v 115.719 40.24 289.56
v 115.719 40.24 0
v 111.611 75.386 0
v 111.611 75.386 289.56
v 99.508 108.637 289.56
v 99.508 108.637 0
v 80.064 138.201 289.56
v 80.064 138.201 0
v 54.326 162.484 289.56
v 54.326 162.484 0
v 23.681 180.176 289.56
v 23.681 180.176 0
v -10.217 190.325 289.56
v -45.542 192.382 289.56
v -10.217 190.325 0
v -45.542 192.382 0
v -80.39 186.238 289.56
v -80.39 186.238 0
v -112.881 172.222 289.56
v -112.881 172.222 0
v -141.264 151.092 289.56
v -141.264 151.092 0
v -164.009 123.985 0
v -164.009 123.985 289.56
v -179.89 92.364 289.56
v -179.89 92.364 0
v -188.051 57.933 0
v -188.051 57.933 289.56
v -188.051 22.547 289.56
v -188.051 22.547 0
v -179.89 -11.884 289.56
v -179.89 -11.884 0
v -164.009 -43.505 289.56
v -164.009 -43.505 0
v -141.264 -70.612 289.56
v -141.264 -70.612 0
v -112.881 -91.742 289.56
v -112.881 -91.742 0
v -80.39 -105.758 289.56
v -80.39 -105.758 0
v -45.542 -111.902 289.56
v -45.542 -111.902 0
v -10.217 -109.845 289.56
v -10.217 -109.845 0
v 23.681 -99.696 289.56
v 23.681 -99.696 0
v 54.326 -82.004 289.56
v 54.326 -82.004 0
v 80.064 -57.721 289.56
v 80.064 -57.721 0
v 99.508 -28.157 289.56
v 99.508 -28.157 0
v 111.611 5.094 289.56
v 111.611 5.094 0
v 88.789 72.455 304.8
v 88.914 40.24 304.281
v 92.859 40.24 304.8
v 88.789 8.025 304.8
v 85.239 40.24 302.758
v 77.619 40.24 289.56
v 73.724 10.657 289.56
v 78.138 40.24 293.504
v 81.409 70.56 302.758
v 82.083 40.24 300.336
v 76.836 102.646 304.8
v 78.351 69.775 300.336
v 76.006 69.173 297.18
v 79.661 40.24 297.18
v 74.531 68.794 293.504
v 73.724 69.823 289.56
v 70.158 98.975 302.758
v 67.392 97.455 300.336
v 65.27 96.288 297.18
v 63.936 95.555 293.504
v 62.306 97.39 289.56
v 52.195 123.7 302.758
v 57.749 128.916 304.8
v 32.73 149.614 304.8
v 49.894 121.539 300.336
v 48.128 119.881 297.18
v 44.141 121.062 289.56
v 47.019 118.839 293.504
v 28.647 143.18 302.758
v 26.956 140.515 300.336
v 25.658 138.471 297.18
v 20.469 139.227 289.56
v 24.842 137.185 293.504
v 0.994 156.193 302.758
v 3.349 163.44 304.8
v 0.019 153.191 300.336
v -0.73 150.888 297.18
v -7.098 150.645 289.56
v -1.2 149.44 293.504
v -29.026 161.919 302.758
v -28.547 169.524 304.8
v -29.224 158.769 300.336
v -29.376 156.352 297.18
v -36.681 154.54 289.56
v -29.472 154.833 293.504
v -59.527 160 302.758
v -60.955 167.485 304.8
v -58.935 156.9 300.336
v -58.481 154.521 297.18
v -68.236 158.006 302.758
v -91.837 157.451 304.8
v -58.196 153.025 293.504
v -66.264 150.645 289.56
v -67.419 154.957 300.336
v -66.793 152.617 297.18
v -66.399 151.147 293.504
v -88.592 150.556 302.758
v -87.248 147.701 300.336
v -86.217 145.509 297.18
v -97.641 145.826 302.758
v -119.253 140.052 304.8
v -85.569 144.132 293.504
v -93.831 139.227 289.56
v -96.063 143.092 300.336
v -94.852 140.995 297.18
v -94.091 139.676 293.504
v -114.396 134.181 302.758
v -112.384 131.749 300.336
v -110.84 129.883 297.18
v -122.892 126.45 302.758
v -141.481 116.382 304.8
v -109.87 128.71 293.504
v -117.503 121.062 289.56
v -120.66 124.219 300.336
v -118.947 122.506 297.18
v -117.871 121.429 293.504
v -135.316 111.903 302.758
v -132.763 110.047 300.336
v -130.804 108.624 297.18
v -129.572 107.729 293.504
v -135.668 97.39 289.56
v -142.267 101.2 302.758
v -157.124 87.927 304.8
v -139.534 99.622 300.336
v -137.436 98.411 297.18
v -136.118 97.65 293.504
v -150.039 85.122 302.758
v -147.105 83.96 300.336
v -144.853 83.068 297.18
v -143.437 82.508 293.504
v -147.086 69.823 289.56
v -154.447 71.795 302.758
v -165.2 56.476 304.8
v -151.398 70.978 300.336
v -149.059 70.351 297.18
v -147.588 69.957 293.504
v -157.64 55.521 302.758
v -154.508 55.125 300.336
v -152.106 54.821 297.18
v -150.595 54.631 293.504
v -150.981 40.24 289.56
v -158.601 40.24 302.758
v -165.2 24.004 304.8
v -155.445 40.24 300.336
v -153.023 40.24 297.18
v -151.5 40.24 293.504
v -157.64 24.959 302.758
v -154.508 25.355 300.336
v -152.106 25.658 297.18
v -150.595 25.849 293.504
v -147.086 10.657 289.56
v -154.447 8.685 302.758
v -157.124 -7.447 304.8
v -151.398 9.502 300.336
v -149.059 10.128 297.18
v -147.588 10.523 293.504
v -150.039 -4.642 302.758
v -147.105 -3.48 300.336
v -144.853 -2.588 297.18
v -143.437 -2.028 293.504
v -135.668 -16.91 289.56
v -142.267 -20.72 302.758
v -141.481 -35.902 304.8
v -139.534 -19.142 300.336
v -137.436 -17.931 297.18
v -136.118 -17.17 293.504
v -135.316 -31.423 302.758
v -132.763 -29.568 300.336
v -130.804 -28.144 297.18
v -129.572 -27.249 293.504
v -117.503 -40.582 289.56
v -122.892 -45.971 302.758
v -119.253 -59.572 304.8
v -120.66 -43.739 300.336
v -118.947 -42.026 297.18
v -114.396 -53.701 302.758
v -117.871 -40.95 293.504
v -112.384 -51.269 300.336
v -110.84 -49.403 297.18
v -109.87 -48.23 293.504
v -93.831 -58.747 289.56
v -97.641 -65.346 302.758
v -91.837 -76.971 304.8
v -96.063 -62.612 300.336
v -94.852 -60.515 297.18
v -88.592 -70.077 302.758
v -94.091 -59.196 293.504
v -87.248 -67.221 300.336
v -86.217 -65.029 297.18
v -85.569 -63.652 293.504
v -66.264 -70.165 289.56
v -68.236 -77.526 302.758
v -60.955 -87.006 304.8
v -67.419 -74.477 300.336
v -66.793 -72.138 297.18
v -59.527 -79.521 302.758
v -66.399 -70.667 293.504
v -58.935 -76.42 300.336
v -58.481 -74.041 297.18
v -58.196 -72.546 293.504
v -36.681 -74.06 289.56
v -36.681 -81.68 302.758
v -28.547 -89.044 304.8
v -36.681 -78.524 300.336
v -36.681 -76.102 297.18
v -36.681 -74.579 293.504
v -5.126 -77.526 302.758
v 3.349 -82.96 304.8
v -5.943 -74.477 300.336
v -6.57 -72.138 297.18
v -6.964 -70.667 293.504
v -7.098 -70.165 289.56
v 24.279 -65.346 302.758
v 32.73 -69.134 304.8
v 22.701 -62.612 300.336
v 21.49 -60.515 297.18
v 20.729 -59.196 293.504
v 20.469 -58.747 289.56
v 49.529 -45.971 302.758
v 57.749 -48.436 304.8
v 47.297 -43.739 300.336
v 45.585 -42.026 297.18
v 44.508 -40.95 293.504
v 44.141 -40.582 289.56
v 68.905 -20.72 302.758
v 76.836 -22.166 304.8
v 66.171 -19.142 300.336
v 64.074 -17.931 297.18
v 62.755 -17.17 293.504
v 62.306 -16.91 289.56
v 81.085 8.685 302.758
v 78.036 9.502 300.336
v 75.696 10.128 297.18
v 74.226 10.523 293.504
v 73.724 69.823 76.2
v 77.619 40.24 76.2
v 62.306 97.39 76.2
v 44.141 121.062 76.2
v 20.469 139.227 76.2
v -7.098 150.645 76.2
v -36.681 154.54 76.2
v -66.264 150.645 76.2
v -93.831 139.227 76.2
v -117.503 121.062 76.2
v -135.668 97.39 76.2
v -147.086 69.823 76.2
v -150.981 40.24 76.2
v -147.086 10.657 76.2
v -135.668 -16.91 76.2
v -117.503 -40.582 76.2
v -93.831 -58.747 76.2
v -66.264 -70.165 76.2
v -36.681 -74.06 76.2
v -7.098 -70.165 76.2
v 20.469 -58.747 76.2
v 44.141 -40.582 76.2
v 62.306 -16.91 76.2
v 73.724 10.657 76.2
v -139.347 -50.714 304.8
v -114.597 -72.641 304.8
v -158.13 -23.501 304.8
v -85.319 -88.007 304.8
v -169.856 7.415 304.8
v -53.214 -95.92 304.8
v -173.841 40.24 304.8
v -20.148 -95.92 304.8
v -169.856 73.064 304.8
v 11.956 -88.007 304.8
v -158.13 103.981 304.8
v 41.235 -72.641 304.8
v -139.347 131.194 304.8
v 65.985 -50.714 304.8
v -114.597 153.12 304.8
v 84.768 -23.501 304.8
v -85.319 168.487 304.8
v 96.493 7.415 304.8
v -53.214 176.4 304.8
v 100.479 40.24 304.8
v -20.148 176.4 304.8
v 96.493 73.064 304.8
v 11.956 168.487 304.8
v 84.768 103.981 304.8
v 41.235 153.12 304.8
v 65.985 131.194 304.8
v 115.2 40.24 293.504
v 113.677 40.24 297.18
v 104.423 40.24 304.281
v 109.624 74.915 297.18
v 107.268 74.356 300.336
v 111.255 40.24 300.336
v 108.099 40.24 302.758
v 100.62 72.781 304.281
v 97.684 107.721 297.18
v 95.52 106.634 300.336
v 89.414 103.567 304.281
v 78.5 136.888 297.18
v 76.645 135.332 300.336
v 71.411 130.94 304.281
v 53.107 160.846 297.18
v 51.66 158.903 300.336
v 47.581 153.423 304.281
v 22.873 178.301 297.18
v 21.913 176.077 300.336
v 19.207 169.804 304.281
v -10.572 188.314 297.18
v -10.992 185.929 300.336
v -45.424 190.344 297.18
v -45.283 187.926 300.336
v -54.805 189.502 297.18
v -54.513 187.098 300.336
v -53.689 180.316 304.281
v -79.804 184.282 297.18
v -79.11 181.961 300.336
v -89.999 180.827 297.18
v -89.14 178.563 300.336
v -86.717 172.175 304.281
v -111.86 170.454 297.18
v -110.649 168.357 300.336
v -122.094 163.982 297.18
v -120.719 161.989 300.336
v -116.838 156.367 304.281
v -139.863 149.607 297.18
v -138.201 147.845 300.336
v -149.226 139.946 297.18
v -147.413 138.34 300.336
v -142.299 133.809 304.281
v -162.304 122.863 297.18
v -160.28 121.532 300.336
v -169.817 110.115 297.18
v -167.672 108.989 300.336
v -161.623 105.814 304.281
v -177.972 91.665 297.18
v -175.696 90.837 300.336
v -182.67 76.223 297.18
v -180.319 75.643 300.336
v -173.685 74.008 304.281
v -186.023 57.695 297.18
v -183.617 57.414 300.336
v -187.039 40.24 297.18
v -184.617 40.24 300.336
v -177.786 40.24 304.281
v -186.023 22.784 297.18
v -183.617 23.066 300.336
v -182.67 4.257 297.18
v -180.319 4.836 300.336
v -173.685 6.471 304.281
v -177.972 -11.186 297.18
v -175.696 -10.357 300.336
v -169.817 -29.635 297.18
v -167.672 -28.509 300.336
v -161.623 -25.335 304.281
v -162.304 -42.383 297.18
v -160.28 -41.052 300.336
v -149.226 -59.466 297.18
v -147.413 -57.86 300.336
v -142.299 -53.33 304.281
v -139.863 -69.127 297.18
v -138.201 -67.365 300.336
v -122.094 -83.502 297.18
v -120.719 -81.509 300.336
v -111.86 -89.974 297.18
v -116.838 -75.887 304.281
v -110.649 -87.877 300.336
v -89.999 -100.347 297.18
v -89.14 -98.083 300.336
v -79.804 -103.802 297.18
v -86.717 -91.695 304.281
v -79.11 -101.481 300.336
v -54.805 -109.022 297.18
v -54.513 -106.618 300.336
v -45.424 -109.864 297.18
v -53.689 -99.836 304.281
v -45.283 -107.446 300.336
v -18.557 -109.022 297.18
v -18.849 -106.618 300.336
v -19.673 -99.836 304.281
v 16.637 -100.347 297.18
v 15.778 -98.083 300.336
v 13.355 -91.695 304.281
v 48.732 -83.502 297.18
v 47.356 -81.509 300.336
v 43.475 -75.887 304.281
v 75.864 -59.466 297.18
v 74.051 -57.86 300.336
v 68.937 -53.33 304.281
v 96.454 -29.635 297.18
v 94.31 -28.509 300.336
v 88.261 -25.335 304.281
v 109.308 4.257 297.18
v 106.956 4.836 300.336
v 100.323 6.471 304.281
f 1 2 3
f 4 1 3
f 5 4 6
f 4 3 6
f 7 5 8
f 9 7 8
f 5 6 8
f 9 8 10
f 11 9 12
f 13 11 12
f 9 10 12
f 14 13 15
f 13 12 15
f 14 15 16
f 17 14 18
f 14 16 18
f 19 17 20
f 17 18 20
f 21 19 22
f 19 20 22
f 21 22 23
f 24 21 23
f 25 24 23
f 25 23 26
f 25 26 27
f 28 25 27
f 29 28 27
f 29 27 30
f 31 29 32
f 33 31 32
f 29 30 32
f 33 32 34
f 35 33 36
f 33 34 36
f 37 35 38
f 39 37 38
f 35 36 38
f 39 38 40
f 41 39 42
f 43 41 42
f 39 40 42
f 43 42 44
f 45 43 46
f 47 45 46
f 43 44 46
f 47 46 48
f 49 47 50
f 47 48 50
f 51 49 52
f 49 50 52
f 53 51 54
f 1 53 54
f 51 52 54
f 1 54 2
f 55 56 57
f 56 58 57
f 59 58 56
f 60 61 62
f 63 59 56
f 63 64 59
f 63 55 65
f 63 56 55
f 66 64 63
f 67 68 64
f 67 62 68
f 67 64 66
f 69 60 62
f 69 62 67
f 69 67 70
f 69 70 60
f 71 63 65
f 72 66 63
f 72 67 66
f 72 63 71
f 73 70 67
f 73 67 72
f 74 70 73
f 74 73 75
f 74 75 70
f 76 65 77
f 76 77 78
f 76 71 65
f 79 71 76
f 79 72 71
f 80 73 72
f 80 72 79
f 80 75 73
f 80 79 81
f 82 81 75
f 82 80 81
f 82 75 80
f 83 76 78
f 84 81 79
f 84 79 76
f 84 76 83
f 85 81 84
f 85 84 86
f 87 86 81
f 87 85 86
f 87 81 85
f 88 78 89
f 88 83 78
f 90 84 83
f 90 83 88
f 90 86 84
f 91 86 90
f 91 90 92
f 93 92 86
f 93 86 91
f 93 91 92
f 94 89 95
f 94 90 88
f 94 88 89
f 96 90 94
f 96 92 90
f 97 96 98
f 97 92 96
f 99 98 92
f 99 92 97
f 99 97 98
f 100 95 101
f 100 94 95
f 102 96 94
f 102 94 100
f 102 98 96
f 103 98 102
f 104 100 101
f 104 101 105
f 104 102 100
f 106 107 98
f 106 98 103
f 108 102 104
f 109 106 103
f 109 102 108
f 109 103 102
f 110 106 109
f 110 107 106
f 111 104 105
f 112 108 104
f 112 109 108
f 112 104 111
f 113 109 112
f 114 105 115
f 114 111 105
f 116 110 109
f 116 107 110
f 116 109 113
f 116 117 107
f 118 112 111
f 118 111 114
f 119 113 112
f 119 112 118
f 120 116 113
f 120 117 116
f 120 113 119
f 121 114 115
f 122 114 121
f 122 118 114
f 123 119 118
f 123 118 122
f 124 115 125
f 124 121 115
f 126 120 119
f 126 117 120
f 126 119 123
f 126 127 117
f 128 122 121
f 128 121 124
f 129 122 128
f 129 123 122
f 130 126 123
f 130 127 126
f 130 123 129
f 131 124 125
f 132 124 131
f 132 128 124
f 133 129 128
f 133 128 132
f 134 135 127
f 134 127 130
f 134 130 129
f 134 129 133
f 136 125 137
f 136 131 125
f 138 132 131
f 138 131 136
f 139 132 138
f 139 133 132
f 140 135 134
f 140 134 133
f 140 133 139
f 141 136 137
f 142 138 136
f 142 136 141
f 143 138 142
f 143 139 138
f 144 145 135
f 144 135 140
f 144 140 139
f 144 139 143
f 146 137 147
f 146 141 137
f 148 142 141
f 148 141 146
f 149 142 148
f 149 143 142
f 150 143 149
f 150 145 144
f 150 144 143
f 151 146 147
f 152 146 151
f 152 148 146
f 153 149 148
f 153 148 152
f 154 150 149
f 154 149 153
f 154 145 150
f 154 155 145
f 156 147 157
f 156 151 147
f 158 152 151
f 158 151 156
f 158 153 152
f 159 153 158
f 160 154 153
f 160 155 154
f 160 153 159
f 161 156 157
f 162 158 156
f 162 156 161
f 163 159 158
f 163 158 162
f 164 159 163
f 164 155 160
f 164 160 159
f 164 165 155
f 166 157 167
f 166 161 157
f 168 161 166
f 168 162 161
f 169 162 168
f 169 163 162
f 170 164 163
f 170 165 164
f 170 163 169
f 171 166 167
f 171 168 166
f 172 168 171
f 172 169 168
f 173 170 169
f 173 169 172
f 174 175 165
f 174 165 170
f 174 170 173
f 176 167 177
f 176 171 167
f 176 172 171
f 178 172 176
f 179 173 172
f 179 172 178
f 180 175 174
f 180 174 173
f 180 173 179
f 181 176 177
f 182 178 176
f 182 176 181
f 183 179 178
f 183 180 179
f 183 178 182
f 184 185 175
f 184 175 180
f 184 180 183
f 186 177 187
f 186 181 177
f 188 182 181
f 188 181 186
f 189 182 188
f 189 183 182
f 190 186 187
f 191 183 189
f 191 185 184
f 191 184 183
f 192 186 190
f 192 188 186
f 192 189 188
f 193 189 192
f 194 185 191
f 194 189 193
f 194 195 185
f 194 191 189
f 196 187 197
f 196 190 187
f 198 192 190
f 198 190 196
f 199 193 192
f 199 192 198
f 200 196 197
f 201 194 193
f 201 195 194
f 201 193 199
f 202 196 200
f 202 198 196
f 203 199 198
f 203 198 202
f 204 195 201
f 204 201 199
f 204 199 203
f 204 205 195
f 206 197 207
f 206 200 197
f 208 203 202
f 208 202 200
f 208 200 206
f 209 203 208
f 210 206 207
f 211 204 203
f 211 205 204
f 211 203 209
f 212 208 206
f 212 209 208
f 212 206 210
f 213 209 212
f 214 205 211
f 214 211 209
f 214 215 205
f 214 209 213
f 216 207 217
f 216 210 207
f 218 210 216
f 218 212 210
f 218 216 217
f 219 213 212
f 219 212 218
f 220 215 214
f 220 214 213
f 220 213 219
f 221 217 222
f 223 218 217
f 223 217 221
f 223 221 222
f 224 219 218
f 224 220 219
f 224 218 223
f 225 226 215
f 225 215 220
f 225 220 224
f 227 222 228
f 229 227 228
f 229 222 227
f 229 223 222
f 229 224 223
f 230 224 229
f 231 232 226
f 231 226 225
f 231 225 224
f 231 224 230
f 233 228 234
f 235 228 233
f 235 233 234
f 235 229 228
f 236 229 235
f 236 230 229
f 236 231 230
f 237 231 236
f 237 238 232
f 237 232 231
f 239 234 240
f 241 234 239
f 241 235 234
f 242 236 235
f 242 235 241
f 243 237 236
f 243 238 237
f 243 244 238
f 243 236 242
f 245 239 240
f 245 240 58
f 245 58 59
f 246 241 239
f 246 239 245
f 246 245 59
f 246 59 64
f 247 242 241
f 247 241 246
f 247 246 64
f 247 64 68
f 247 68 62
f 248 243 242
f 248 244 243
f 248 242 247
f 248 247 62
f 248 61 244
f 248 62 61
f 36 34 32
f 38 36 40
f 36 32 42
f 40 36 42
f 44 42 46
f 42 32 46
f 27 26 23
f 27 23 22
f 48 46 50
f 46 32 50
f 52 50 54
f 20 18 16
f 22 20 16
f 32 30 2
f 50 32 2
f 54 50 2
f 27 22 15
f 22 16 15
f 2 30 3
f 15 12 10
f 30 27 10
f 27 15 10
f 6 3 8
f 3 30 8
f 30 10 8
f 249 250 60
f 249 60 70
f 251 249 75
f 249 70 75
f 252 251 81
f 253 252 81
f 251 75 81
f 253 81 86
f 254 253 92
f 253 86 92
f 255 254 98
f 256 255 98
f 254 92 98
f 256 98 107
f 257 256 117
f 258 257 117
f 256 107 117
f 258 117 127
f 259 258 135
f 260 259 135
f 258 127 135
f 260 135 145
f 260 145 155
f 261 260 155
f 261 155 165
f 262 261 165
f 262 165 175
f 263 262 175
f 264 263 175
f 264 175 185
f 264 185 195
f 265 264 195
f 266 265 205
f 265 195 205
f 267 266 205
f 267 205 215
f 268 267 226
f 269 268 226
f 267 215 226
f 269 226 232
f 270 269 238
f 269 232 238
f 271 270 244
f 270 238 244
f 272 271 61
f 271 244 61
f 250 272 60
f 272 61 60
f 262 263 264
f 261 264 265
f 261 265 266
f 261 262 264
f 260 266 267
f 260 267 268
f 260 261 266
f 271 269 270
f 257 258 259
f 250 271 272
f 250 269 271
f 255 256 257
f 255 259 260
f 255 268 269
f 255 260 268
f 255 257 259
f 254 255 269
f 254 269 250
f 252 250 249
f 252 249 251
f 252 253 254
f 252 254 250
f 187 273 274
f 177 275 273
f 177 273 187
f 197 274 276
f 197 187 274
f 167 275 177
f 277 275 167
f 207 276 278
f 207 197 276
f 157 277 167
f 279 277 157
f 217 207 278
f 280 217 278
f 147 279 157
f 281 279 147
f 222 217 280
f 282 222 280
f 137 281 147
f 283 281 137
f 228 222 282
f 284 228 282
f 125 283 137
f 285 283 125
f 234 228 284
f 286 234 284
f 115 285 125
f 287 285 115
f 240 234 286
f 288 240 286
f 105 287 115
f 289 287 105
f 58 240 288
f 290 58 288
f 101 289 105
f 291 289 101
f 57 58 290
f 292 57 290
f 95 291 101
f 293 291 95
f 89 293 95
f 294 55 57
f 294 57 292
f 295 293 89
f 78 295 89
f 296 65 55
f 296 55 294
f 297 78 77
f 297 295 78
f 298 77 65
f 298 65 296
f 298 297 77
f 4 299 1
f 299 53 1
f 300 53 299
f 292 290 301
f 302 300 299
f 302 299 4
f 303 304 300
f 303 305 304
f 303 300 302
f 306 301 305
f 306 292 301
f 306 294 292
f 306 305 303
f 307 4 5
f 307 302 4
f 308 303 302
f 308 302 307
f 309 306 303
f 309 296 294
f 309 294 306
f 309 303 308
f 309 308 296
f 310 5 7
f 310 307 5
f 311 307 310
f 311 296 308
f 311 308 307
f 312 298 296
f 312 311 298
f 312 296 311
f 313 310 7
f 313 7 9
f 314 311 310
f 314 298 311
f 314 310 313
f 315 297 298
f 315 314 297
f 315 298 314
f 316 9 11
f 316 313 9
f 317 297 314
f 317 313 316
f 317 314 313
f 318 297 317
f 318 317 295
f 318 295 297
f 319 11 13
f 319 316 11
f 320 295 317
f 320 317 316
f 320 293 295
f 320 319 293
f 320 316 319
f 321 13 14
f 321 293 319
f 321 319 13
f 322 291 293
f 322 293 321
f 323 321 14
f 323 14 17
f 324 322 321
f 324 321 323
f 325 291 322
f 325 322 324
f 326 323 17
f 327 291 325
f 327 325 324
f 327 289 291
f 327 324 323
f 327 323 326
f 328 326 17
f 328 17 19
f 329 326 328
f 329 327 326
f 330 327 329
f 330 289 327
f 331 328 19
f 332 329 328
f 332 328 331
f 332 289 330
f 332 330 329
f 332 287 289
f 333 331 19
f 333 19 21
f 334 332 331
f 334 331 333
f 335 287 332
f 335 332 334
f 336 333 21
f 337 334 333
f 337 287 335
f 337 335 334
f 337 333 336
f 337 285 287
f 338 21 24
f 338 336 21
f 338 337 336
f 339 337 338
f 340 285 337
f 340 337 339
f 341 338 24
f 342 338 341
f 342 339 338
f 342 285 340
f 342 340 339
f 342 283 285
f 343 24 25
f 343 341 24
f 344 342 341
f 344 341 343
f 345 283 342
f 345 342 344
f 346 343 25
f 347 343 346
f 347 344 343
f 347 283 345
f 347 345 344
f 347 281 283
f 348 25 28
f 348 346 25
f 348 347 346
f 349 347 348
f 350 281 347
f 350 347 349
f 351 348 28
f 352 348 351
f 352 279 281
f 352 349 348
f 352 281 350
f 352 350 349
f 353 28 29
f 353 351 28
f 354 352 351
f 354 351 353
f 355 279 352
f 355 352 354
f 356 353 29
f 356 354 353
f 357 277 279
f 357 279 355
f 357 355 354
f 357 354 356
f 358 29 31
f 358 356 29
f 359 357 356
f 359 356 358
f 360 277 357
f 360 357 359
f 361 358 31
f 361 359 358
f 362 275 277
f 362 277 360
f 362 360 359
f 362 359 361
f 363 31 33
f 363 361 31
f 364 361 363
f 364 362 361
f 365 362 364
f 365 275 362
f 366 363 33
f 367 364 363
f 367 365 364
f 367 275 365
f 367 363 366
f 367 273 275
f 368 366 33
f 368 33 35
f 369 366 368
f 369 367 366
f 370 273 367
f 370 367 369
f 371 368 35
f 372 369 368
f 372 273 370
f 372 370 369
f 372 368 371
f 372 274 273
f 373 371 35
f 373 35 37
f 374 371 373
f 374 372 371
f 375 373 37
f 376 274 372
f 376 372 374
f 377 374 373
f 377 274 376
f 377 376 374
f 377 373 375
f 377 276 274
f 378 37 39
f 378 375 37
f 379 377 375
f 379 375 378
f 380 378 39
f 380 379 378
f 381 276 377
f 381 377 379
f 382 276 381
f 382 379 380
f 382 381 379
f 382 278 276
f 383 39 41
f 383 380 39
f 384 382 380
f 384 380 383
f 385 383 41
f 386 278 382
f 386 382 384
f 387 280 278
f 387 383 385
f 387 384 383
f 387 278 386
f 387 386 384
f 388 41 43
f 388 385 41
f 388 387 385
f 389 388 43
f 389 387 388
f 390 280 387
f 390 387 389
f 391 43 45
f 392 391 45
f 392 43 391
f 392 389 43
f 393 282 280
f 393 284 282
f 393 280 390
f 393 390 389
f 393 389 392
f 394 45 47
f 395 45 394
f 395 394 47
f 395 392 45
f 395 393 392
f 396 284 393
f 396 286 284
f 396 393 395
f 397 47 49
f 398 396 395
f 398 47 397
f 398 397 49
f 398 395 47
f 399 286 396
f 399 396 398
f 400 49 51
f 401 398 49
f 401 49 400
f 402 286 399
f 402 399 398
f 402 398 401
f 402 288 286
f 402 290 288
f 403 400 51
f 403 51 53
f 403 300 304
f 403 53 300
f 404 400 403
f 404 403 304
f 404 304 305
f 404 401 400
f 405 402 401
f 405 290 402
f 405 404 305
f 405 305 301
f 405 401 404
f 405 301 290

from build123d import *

# Parameters (mm, degrees)
F0_R     = 152.4
F1_DEPTH = 304.8
F2_R     = 114.3
F3_DEPTH = 228.6
F4_R     = 15.24


with BuildPart() as f1:
    # F0 (on Top) → F1 (new body)
    with BuildSketch(Plane.XY):
        with Locations((-36.681142, 40.239949)):
            Circle(F0_R)
    extrude(amount=F1_DEPTH)

    # F2 (on face) → F3 (cut)
    with BuildSketch(Plane.XY.offset(304.8)):
        with Locations((-36.681142, 40.239949)):
            Circle(F2_R)
    extrude(amount=-F3_DEPTH, mode=Mode.SUBTRACT)

    # F4
    f4_edges = [f1.edges().sort_by_distance(p)[0] for p in [
        (-150.981142, 40.239949, 304.8),
        (-189.081142, 40.239949, 304.8),
    ]]
    fillet(f4_edges, radius=F4_R)


solid = f1.part
